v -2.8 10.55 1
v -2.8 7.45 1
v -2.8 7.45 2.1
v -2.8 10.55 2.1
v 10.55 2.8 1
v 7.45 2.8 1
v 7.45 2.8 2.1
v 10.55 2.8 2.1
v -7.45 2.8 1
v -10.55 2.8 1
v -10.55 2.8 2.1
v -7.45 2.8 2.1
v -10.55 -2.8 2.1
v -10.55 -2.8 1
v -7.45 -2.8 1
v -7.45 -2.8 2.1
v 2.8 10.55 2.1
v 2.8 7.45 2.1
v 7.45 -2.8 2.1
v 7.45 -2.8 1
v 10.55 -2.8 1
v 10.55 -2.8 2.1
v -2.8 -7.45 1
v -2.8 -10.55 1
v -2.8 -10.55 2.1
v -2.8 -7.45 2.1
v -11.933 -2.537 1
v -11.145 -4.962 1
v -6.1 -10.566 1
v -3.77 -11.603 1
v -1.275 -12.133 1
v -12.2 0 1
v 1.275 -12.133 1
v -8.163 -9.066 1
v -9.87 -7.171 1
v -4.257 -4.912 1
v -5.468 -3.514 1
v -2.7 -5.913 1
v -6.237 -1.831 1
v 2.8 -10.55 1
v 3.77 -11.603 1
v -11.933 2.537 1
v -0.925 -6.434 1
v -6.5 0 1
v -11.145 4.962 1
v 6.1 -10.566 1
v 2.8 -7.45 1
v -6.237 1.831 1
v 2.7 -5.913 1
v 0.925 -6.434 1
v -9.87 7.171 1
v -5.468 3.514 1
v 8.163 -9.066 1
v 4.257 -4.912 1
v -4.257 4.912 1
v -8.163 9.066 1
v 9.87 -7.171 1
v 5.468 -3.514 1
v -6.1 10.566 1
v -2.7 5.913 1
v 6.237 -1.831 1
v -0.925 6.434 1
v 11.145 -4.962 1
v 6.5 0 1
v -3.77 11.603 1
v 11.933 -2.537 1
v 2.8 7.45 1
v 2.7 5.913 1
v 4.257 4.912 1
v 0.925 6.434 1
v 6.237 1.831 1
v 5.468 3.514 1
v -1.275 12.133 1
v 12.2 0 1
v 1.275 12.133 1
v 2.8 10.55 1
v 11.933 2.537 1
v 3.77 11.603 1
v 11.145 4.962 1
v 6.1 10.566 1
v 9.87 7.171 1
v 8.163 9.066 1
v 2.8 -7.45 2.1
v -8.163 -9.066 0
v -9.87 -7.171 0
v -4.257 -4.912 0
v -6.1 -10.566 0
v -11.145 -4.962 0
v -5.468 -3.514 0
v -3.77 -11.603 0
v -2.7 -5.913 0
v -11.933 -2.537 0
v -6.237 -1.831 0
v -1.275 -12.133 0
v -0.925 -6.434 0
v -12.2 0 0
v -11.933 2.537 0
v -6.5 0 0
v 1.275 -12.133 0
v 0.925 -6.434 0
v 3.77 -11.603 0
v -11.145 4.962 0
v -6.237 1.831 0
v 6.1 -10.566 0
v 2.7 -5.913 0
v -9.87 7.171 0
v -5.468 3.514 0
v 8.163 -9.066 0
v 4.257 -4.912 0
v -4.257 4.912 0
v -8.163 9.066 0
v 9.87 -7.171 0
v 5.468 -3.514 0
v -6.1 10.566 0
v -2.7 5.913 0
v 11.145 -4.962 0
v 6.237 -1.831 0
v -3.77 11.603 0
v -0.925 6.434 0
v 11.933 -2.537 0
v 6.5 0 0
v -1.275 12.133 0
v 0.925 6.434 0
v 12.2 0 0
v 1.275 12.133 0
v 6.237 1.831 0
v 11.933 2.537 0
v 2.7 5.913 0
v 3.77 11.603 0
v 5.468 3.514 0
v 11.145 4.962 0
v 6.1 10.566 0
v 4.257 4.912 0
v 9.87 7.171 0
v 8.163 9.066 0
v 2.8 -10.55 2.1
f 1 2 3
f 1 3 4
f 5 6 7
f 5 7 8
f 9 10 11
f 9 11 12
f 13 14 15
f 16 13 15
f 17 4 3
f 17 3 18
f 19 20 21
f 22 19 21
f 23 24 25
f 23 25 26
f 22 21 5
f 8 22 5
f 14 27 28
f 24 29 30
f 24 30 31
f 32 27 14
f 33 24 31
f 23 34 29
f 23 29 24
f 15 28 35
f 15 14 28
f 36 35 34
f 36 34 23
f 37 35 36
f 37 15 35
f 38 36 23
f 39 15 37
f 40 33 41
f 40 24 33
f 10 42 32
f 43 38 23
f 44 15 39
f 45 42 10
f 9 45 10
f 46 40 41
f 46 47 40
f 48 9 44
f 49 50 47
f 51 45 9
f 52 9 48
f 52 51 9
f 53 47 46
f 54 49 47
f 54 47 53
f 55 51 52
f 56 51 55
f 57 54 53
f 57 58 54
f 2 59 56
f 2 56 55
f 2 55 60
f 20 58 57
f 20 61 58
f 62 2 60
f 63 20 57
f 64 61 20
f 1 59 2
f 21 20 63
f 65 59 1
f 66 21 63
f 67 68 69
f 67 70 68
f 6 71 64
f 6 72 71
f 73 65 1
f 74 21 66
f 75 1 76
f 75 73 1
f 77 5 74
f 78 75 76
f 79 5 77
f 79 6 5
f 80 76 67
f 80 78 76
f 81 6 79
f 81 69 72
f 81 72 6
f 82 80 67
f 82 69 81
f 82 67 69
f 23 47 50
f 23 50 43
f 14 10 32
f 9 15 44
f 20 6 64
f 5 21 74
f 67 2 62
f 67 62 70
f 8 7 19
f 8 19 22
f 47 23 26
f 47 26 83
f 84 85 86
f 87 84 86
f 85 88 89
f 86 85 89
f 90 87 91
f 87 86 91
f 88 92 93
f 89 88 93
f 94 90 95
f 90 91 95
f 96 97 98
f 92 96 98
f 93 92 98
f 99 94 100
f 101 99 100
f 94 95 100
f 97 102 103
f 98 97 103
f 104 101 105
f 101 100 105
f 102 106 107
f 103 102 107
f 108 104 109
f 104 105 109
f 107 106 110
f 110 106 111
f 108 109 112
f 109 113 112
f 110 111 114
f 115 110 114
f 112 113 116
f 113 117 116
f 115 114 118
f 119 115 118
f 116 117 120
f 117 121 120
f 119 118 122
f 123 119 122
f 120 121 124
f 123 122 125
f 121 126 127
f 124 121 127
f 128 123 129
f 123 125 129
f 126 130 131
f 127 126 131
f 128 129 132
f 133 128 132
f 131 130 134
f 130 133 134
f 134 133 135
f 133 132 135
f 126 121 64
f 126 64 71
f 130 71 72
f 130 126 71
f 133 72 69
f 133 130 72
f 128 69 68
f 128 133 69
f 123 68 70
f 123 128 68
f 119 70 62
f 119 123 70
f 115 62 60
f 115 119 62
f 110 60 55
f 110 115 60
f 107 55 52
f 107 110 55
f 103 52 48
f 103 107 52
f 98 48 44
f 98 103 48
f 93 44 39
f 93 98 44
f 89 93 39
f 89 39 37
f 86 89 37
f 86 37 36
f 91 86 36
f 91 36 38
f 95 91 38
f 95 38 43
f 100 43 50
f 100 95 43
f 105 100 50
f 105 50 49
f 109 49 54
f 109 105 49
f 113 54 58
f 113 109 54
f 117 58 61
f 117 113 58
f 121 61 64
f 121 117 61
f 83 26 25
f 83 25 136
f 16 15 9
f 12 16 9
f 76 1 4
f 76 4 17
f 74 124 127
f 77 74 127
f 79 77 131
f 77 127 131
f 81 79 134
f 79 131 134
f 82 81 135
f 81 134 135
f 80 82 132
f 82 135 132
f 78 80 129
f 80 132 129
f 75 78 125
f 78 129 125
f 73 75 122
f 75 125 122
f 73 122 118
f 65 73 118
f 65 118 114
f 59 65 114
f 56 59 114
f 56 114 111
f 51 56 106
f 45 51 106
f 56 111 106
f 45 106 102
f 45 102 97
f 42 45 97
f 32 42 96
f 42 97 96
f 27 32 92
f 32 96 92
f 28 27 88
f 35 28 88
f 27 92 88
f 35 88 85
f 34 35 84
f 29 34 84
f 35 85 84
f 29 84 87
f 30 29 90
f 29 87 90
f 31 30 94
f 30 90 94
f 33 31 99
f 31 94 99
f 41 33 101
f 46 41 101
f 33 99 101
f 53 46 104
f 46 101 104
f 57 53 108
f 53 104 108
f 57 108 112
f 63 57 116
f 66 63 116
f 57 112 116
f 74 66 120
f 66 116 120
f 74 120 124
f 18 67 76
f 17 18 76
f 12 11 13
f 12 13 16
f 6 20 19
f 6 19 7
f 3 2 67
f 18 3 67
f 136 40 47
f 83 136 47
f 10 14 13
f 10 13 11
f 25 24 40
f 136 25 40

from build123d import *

# Parameters (mm, degrees)
F0_R     = 12.2
F0_R_2   = 6.5
F1_DEPTH = 1
F3_W     = 5.6
F3_H     = 3.1
F3_W_2   = 3.1
F3_H_2   = 5.6
F4_DEPTH = 1.1


with BuildPart() as f1:
    # F0 (on Top) → F1 (new body)
    with BuildSketch(Plane.XY):
        Circle(F0_R)
        Circle(F0_R_2, mode=Mode.SUBTRACT)
    extrude(amount=F1_DEPTH)

    # F3 (on offset) → F4 (join)
    with BuildSketch(Plane.XY.offset(1)):
        with Locations((0, 9)):
            Rectangle(F3_W, F3_H)
        with Locations((9, 0)):
            Rectangle(F3_W_2, F3_H_2)
        with Locations((0, -9)):
            Rectangle(F3_W, F3_H)
        with Locations((-9, 0)):
            Rectangle(F3_W_2, F3_H_2)
    extrude(amount=F4_DEPTH)


solid = f1.part
